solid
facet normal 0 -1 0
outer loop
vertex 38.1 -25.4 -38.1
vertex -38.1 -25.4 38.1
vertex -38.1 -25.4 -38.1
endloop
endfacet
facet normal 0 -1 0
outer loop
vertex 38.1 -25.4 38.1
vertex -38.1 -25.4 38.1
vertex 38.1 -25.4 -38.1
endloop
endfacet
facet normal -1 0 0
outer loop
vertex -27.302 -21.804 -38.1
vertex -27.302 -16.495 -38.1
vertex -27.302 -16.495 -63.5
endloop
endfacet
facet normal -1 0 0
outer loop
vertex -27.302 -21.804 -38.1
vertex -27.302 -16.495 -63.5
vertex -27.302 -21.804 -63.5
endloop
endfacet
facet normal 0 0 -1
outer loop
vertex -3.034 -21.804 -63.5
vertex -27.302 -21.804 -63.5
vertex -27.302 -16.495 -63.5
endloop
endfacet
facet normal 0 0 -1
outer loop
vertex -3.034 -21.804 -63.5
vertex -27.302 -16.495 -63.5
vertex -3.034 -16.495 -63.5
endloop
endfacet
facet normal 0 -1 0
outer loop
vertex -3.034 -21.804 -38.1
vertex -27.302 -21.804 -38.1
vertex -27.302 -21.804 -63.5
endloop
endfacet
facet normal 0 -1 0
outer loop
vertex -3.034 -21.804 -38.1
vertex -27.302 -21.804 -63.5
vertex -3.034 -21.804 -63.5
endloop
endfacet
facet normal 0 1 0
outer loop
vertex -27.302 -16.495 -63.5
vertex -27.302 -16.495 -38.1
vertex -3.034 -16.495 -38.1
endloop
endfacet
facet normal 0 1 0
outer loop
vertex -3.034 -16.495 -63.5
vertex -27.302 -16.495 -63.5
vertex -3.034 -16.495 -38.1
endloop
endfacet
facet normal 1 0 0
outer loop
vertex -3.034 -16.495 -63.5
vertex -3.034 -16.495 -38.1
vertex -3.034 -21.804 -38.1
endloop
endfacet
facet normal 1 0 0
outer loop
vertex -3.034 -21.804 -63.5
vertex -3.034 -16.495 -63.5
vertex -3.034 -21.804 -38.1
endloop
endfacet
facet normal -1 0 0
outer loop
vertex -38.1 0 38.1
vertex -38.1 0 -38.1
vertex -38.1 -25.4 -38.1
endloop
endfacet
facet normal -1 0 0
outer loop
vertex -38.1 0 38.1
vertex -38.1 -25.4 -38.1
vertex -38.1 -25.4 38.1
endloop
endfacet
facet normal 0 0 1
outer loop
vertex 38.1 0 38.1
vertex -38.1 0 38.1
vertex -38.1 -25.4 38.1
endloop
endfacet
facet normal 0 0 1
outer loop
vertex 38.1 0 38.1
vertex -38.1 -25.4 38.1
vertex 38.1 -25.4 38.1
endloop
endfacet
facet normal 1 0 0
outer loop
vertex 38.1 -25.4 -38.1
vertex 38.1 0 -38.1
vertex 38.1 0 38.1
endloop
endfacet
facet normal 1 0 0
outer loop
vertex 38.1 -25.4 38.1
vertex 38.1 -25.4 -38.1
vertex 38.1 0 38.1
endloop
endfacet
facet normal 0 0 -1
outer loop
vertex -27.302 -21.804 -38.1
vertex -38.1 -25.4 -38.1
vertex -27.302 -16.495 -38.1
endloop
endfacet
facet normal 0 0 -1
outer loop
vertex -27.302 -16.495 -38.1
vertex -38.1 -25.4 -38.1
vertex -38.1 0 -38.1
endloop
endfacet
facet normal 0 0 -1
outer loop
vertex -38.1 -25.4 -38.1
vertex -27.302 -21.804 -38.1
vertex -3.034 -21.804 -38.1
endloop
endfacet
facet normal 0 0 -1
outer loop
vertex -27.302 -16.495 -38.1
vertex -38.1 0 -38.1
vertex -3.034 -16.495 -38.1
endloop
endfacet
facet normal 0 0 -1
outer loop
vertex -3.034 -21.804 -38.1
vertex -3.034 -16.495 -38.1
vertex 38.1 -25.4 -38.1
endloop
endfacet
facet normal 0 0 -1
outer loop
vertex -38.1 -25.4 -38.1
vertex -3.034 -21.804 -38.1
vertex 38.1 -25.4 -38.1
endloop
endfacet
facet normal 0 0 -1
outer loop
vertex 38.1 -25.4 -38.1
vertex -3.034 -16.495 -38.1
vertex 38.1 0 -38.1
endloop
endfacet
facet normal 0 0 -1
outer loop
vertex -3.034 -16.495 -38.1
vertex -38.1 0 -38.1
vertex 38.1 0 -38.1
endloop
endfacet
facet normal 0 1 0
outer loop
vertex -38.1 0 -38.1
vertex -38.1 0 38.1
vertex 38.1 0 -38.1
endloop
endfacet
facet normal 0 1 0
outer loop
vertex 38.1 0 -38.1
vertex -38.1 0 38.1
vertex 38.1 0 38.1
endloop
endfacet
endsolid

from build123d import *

# Parameters (mm, degrees)
F0_W     = 76.2
F0_H     = 76.2
F1_DEPTH = 25.4
F2_W     = 24.268436
F2_H     = 5.308717
F3_DEPTH = 25.4


with BuildPart() as f1:
    # F0 (on Front) → F1 (new body)
    with BuildSketch(Plane.XZ):
        Rectangle(F0_W, F0_H)
    extrude(amount=F1_DEPTH)

    # F2 (on face) → F3 (join)
    with BuildSketch(Plane(origin=(0, 0, -38.1), x_dir=(1, 0, 0), z_dir=(0, 0, -1))):
        with Locations((-15.167773, 19.149313)):
            Rectangle(F2_W, F2_H)
    extrude(amount=F3_DEPTH)


solid = f1.part
